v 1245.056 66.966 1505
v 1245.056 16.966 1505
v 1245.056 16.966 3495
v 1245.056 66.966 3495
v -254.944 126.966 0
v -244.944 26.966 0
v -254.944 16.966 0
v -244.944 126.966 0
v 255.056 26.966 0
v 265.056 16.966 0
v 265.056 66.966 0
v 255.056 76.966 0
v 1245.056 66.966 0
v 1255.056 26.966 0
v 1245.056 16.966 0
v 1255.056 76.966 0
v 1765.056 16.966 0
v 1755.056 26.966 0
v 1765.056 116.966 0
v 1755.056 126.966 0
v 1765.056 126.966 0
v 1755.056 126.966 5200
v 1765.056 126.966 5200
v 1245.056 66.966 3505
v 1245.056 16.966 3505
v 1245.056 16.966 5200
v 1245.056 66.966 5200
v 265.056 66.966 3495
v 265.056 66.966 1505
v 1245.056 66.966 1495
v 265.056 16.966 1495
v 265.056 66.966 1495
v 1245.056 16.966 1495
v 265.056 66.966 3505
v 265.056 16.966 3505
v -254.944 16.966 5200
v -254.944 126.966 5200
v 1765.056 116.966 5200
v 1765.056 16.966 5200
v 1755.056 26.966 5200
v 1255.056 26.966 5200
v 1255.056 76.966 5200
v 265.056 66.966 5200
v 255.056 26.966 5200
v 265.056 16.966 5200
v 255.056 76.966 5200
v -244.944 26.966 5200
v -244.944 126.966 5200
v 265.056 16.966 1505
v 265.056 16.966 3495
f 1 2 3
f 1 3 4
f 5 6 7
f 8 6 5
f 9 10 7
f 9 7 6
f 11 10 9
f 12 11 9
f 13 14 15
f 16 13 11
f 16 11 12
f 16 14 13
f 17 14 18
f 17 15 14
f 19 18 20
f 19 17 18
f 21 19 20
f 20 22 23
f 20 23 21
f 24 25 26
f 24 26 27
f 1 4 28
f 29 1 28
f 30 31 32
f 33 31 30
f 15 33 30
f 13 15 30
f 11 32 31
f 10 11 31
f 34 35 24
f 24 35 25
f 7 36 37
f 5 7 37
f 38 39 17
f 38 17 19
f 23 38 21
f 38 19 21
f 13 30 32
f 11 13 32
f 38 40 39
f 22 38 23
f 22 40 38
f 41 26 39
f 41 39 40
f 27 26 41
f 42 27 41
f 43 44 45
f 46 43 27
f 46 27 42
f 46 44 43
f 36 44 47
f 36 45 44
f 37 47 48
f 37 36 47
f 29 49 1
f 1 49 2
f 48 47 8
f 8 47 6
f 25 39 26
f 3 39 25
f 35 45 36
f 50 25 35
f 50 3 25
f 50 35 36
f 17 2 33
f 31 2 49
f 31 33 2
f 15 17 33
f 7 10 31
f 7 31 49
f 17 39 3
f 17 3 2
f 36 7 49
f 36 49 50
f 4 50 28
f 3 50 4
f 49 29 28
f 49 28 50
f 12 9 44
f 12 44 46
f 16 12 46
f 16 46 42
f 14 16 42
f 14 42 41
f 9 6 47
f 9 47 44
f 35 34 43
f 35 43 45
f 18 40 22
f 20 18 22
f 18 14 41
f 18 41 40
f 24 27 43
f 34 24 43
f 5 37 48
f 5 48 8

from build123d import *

# Parameters (mm, degrees)
BOSS_EXTRUDE1_DEPTH = 5200
RIB1_REACH          = 5507.482
SKETCH2_WALLS_W     = 11992.963229826
SKETCH2_WALLS_H     = 10
SKETCH3_W           = 70
SKETCH3_H           = 5
BOSS_EXTRUDE2_DEPTH = 35
SKETCH4_W           = 70
SKETCH4_H           = 5
BOSS_EXTRUDE3_DEPTH = 35
SKETCH6_W           = 60
SKETCH6_H           = 20
BOSS_EXTRUDE5_DEPTH = 2000
SKETCH7_W           = 10
SKETCH7_H           = 39.988397119
SKETCH7_W_2         = 9.978776679
SKETCH7_H_2         = 40
CUT_EXTRUDE1_DEPTH  = 5518.420337809
SKETCH8_W           = 10.659440655
SKETCH8_H           = 50.244619817
SKETCH8_W_2         = 36.147201271
SKETCH8_H_2         = 63.106865185
CUT_EXTRUDE2_DEPTH  = 5518.420337809
SKETCH9_W           = 81.57273963
SKETCH9_H           = 67.362460328
SKETCH9_W_2         = 80.643055667
SKETCH9_H_2         = 59.078828037
CUT_EXTRUDE3_DEPTH  = 5518.420337809
SPLIT1_START        = 106.966292135
SPLIT1_OUTLINE_W    = 2000
SPLIT1_OUTLINE_H    = 60
SPLIT1_DEPTH        = 20


# Read off the part's stored shape, not the designer's step: Split1
with BuildPart() as part:
    # Sketch1 → Boss-Extrude1 (new body)
    with BuildSketch(Plane.XY):
        Polygon((-294.943820225, 76.966292135), (-294.943820225, 126.966292135), (-244.943820225, 126.966292135), (-244.943820225, 26.966292135), (255.056179775, 26.966292135), (255.056179775, 76.966292135), (1255.056179775, 76.966292135), (1255.056179775, 26.966292135), (1755.056179775, 26.966292135), (1755.056179775, 126.966292135), (1805.056179775, 126.966292135), (1805.056179775, 76.966292135), (1795.056179775, 76.966292135), (1795.056179775, 116.966292135), (1765.056179775, 116.966292135), (1765.056179775, 16.966292135), (1245.056179775, 16.966292135), (1245.056179775, 66.966292135), (265.056179775, 66.966292135), (265.056179775, 16.966292135), (-254.943820225, 16.966292135), (-254.943820225, 116.966292135), (-284.943820225, 116.966292135), (-284.943820225, 76.966292135), align=None)
    extrude(amount=BOSS_EXTRUDE1_DEPTH)

    # Sketch2 walls → Rib1 (add, up to next)
    with BuildSketch(Plane.XZ.offset(-16.966292135), mode=Mode.PRIVATE) as rib1_sk1:
        with Locations((755.056179775, 1500)):
            Rectangle(SKETCH2_WALLS_W, SKETCH2_WALLS_H)
    rib1_tool1 = extrude(rib1_sk1.sketch, amount=-RIB1_REACH, mode=Mode.PRIVATE) - part.part
    # Sketch2 walls → Rib1 (add, up to next)
    with BuildSketch(Plane.XZ.offset(-16.966292135), mode=Mode.PRIVATE) as rib1_sk2:
        with Locations((755.056179775, 3500)):
            Rectangle(SKETCH2_WALLS_W, SKETCH2_WALLS_H)
    rib1_tool2 = extrude(rib1_sk2.sketch, amount=-RIB1_REACH, mode=Mode.PRIVATE) - part.part
    add(rib1_tool1.solids().sort_by_distance((755.056179775, 16.966292135, 1500))[0])
    add(rib1_tool2.solids().sort_by_distance((755.056179775, 16.966292135, 3500))[0])

    # Sketch3 → Boss-Extrude2 (add)
    with BuildSketch(Plane(origin=(1805.056179775, 0, 0), x_dir=(0, 0, -1), z_dir=(1, 0, 0))):
        with Locations((-35, 124.466292135)):
            Rectangle(SKETCH3_W, SKETCH3_H)
        with Locations((-5165, 124.466292135)):
            Rectangle(SKETCH3_W, SKETCH3_H)
    extrude(amount=BOSS_EXTRUDE2_DEPTH)

    # Sketch4 → Boss-Extrude3 (add)
    with BuildSketch(Plane.ZY.offset(294.943820225)):
        with Locations((35, 124.466292135)):
            Rectangle(SKETCH4_W, SKETCH4_H)
        with Locations((5165, 124.466292135)):
            Rectangle(SKETCH4_W, SKETCH4_H)
    extrude(amount=BOSS_EXTRUDE3_DEPTH)

    # Sketch6 → Boss-Extrude5 (add)
    with BuildSketch(Plane(origin=(-244.943820225, 0, 0), x_dir=(0, 0, -1), z_dir=(1, 0, 0))):
        with Locations((-5170, 116.966292135)):
            Rectangle(SKETCH6_W, SKETCH6_H)
    extrude(amount=BOSS_EXTRUDE5_DEPTH)

    # Sketch7 → Cut-Extrude1 (cut, through all)
    with BuildSketch(Plane.XY.offset(5200)):
        with Locations((-289.943820225, 96.972093575)):
            Rectangle(SKETCH7_W, SKETCH7_H)
        with Locations((1800.045568115, 96.966292135)):
            Rectangle(SKETCH7_W_2, SKETCH7_H_2)
    extrude(amount=-CUT_EXTRUDE1_DEPTH, mode=Mode.SUBTRACT)


with BuildPart() as cut_extrude1_piece_1:
    # of the separate pieces the step leaves, piece 1, a body of its own (cut_extrude1_pieces)
    add(part.part.solids().sort_by_distance((-294.943820225, 116.966292135, 0))[0])


with BuildPart() as cut_extrude1_piece_2:
    # of the separate pieces the step leaves, piece 2, a body of its own (cut_extrude1_pieces)
    add(part.part.solids().sort_by_distance((-294.943820225, 76.966292135, 0))[0])


with BuildPart() as cut_extrude2_tool:
    # Sketch8 → Cut-Extrude2 (new, through all)
    with BuildSketch(Plane.XY.offset(5200)):
        with Locations((1805.361416771, 91.843982227)):
            Rectangle(SKETCH8_W, SKETCH8_H)
        with Locations((-291.630819883, 60.290549635)):
            Rectangle(SKETCH8_W_2, SKETCH8_H_2)
    extrude(amount=-CUT_EXTRUDE2_DEPTH)


with BuildPart() as cut_extrude1_piece_1_1:
    add(cut_extrude1_piece_1.part)

    # Cut-Extrude2: cut by cut_extrude2_tool
    add(cut_extrude2_tool.part, mode=Mode.SUBTRACT)

    # Sketch9 → Cut-Extrude3 (cut, through all)
    with BuildSketch(Plane(origin=(0, 0, 0), x_dir=(-1, 0, 0), z_dir=(0, 0, -1))):
        with Locations((295.73019004, 130.148013634)):
            Rectangle(SKETCH9_W, SKETCH9_H)
        with Locations((-1805.377707609, 122.845657173)):
            Rectangle(SKETCH9_W_2, SKETCH9_H_2)
    extrude(amount=-CUT_EXTRUDE3_DEPTH, mode=Mode.SUBTRACT)

    # Split1 outline → Split1 (cut)
    with BuildSketch(Plane(origin=(0, 0, 0), x_dir=(1, 0, 0), z_dir=(0, 1, 0)).offset(SPLIT1_START)):
        with Locations((755.056179775, -5170)):
            Rectangle(SPLIT1_OUTLINE_W, SPLIT1_OUTLINE_H)
    extrude(amount=SPLIT1_DEPTH, mode=Mode.SUBTRACT)


with BuildPart() as cut_extrude1_piece_2_1:
    add(cut_extrude1_piece_2.part)

    # Cut-Extrude2: cut by cut_extrude2_tool
    add(cut_extrude2_tool.part, mode=Mode.SUBTRACT)


solid = cut_extrude1_piece_1_1.part
